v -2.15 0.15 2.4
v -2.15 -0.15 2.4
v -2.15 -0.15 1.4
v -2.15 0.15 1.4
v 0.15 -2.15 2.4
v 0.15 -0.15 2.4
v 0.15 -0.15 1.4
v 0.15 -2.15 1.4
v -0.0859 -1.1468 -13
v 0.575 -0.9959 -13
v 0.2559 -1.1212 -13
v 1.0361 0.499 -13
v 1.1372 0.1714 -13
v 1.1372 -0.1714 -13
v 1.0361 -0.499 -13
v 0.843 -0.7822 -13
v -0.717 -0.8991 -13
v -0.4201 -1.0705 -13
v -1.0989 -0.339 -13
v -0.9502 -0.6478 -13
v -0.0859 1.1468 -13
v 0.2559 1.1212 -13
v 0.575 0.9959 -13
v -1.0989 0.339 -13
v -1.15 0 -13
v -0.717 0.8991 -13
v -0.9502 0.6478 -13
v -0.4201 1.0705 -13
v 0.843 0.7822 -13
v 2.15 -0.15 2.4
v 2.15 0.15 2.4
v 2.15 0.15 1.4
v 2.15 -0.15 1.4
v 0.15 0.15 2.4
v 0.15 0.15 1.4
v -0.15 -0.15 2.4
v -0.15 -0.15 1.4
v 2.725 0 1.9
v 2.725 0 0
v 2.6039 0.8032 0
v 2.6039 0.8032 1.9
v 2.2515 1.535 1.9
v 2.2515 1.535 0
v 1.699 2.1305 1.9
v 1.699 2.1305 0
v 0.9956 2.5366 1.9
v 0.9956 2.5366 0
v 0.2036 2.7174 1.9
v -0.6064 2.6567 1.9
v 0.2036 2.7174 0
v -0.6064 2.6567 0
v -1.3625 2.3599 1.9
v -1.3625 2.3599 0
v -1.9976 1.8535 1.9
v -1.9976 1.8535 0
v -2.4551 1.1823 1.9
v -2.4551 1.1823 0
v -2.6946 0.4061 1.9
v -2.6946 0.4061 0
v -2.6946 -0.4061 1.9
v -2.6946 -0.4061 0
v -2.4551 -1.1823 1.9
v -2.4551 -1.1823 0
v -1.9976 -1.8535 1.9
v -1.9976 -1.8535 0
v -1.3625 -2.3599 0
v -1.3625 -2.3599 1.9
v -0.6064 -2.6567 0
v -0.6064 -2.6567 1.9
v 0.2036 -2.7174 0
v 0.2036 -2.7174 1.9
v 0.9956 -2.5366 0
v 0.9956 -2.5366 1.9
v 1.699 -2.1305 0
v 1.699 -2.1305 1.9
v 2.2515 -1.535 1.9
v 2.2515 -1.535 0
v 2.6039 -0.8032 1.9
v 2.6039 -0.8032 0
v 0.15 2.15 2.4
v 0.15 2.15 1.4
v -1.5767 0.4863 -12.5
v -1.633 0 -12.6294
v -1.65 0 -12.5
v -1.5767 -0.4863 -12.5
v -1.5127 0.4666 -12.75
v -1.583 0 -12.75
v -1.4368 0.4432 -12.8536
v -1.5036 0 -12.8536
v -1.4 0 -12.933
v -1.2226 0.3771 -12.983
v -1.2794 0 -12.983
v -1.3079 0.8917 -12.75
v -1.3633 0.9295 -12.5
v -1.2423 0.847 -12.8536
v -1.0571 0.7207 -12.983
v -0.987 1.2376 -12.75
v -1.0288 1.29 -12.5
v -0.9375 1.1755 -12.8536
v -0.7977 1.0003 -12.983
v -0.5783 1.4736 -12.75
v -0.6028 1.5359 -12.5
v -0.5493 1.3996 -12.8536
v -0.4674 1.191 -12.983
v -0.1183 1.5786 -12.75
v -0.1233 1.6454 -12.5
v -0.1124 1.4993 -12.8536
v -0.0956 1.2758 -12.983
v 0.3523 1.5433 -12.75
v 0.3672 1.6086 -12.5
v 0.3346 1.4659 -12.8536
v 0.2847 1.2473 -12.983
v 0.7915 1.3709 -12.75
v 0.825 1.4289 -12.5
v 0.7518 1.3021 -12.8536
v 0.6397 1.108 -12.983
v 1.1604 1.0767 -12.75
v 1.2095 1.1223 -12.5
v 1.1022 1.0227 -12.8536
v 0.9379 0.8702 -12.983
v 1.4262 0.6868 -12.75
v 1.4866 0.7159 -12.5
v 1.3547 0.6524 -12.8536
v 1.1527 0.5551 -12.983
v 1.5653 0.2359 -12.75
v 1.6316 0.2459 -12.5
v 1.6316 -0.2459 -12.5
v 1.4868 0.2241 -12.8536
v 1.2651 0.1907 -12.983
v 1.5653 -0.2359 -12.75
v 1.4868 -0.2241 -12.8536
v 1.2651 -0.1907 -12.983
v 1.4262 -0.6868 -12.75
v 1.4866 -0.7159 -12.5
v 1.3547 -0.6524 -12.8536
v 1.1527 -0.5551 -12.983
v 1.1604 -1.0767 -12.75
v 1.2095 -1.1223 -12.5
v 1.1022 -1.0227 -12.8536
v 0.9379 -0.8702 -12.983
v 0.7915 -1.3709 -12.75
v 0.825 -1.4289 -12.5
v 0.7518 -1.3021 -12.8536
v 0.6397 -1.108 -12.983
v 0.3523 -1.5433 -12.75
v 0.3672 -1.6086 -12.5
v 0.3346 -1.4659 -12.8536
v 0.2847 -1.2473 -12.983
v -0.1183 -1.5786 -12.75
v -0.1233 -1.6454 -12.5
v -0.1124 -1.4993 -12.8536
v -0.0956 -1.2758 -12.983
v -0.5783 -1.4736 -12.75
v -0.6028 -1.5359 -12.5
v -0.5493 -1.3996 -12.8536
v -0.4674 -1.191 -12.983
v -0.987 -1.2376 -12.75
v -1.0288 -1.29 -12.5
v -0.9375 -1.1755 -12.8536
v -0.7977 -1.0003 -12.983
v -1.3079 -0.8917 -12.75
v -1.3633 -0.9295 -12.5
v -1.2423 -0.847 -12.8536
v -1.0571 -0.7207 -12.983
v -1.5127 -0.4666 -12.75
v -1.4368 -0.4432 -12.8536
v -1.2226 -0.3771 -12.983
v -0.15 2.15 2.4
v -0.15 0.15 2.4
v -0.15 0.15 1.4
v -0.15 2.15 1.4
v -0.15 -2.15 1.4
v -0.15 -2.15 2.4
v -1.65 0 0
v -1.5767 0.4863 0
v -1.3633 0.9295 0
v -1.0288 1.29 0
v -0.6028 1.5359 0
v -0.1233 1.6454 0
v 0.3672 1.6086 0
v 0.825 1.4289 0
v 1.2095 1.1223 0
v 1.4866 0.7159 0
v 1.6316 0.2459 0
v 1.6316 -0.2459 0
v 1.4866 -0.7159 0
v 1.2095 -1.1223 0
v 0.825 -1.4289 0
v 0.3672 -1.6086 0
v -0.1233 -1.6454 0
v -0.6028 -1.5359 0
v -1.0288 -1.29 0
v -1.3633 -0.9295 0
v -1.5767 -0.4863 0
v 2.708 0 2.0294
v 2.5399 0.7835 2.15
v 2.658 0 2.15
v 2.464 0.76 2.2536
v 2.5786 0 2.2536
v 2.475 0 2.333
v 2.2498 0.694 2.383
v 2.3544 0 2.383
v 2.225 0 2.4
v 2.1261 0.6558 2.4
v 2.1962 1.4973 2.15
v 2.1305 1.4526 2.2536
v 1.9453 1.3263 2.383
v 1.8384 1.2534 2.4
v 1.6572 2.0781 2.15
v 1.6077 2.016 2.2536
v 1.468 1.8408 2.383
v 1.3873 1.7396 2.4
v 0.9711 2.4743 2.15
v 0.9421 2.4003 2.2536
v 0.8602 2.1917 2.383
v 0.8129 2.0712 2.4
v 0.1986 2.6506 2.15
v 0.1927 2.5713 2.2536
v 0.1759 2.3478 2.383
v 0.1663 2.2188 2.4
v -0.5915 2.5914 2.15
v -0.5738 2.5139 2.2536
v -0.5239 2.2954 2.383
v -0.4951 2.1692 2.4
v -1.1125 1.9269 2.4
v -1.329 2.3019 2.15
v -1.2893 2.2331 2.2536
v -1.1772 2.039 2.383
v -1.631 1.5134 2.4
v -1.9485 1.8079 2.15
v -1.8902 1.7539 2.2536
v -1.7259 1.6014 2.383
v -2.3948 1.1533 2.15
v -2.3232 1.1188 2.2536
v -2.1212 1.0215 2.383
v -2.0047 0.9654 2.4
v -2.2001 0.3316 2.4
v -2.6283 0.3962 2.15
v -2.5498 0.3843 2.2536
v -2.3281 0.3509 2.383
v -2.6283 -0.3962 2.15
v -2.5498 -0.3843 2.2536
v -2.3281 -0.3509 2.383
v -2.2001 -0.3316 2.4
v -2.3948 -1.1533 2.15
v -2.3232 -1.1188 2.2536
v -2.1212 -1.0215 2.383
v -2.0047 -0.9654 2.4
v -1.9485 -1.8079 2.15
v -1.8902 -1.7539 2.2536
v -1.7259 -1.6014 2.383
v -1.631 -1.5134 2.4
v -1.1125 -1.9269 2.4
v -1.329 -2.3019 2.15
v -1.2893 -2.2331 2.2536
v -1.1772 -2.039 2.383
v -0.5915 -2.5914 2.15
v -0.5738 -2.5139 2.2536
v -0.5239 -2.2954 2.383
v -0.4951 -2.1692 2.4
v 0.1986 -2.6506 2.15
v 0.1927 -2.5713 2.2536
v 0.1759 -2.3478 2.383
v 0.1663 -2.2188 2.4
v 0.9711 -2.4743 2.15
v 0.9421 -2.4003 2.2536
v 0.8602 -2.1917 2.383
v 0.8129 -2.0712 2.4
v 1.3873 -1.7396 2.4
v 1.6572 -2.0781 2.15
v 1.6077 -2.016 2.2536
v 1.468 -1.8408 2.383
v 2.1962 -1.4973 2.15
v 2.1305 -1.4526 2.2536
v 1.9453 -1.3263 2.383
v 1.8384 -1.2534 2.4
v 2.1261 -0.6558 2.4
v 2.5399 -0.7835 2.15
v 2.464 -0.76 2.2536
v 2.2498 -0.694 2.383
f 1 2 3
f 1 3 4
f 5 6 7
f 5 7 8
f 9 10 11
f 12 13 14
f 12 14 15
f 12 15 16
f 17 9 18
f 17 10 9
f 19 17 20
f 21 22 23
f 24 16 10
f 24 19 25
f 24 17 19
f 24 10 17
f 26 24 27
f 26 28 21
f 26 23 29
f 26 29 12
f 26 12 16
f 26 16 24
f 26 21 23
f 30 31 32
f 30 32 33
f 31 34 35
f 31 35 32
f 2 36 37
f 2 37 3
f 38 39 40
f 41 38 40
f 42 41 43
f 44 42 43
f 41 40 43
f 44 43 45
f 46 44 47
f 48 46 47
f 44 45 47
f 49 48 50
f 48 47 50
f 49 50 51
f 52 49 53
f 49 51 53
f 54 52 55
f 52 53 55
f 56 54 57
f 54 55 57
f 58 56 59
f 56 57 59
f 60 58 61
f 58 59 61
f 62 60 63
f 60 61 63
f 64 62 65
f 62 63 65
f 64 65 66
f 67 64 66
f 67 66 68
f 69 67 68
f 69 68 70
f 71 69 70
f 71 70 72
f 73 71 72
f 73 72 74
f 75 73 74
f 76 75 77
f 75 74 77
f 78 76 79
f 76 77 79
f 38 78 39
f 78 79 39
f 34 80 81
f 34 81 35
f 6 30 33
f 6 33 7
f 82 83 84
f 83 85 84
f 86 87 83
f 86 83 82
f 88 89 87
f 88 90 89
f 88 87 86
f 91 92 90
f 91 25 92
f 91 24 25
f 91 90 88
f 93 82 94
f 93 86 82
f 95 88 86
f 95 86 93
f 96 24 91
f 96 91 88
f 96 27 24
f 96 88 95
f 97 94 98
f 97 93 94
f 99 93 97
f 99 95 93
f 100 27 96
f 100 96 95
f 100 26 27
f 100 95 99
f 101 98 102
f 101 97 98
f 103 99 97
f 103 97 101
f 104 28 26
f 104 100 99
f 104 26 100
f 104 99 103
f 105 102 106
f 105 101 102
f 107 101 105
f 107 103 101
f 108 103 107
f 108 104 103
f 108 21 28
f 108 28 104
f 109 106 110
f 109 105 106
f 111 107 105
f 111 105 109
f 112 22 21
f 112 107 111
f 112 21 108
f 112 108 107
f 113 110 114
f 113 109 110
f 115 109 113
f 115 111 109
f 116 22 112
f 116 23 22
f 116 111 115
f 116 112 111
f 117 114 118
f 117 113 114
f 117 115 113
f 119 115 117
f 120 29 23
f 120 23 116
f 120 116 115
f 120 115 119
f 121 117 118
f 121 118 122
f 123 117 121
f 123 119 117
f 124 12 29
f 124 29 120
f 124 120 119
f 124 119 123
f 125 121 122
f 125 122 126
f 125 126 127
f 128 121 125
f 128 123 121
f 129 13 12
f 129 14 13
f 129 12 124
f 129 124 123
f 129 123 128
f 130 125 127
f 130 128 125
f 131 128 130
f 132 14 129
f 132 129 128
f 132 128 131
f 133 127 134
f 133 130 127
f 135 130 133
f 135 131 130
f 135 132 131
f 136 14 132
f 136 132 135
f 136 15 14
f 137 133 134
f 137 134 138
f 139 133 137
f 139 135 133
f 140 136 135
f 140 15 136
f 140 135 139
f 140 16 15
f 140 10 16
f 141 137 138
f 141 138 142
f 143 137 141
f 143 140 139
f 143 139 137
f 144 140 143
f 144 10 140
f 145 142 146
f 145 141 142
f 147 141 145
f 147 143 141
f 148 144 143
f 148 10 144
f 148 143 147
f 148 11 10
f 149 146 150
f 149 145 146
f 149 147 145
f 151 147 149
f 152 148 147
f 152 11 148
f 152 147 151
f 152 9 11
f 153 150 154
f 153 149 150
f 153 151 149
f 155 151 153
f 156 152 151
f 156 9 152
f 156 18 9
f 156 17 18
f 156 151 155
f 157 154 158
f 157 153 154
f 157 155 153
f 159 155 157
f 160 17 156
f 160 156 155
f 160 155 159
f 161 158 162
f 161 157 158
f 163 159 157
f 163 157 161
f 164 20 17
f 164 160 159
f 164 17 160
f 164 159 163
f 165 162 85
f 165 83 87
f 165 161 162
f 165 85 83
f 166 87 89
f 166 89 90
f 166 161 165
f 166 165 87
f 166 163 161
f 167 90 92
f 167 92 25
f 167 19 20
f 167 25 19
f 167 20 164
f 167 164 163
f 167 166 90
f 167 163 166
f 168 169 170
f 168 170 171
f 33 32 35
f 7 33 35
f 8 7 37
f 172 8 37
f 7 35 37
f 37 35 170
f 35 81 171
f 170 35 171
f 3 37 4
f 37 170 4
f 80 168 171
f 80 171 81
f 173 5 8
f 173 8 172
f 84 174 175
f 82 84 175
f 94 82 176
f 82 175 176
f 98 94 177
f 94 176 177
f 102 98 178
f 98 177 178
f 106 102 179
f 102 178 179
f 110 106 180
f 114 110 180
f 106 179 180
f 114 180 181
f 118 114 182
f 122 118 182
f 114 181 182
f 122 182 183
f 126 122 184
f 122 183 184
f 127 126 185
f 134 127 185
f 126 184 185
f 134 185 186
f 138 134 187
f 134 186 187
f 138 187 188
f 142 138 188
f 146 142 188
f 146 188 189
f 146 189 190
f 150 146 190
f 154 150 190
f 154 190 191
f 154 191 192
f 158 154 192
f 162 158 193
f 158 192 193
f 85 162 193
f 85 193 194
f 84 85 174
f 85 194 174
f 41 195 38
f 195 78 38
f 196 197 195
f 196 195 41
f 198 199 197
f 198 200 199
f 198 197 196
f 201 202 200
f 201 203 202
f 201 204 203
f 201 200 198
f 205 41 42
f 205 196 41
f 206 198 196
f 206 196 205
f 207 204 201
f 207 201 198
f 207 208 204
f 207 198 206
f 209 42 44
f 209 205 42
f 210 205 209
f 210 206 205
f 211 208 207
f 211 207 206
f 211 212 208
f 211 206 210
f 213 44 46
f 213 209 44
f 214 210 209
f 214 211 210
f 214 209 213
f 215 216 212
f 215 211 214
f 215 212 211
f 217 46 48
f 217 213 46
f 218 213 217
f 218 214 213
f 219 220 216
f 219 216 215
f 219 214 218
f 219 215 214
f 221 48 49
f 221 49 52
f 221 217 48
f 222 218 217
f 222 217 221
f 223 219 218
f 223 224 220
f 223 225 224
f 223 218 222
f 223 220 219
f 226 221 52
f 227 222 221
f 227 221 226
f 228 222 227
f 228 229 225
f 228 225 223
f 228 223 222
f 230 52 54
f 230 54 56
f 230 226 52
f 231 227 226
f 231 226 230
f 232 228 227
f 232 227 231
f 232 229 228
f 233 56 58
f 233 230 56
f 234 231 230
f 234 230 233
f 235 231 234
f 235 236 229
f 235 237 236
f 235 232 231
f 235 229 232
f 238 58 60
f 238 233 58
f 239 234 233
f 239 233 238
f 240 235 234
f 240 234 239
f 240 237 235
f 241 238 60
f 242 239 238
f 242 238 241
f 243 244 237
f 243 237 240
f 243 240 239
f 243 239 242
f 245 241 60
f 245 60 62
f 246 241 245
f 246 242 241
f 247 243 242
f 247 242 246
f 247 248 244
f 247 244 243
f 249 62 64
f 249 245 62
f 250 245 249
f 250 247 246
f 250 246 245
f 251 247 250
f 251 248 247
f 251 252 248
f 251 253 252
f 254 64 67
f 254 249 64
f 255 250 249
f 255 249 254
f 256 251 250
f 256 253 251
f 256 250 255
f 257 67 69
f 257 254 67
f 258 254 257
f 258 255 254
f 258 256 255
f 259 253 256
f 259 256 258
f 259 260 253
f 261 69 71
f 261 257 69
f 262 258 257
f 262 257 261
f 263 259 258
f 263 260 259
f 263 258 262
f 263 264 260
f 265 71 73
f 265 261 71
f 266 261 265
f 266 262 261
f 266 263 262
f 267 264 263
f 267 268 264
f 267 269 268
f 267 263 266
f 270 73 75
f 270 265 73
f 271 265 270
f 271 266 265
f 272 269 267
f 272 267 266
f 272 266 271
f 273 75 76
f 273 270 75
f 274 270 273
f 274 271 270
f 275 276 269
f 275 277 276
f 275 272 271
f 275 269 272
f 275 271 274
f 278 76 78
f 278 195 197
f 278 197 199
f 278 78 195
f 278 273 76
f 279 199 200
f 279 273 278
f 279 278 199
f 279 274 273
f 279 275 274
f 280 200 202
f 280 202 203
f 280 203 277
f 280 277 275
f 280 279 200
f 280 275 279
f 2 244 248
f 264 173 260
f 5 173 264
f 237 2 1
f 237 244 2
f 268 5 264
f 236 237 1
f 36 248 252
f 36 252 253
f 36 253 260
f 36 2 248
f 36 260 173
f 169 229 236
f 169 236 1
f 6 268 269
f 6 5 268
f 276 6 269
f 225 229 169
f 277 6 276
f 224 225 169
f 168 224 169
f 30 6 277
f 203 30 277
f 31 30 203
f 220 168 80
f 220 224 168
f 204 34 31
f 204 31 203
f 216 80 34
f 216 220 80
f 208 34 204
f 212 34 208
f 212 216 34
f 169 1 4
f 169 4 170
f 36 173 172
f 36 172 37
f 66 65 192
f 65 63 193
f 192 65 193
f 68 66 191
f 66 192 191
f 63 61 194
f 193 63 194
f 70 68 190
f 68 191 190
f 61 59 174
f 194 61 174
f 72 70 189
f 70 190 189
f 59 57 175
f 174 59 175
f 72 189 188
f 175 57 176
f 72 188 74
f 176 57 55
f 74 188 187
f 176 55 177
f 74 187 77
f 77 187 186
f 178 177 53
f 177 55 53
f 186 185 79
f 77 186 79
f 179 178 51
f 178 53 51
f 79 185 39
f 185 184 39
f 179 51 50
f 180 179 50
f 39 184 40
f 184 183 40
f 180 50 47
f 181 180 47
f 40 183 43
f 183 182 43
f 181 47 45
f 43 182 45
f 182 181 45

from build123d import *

# Parameters (mm, degrees)
SKICA1_R                 = 2.725
P_IDAT_VYSUNUT_M1_DEPTH  = 2.4
SKICA2_R                 = 1.65
P_IDAT_VYSUNUT_M3_DEPTH  = 13
ODEBRAT_VYSUNUT_M1_DEPTH = 1
ZAOBLIT1_R               = 0.5


with BuildPart() as part:
    # Skica1 → Přidat vysunutím1 (new body)
    with BuildSketch(Plane.XY):
        Circle(SKICA1_R)
    extrude(amount=P_IDAT_VYSUNUT_M1_DEPTH)

    # Skica2 → Přidat vysunutím3 (add)
    with BuildSketch(Plane(origin=(0, 0, 0), x_dir=(-1, 0, 0), z_dir=(0, 0, -1))):
        Circle(SKICA2_R)
    extrude(amount=P_IDAT_VYSUNUT_M3_DEPTH)

    # Skica4 → Odebrat vysunutím1 (cut)
    with BuildSketch(Plane.XY.offset(2.4)):
        Polygon((-0.15, 0.15), (-0.15, 2.15), (0.15, 2.15), (0.15, 0.15), (2.15, 0.15), (2.15, -0.15), (0.15, -0.15), (0.15, -2.15), (-0.15, -2.15), (-0.15, -0.15), (-2.15, -0.15), (-2.15, 0.15), align=None)
    extrude(amount=-ODEBRAT_VYSUNUT_M1_DEPTH, mode=Mode.SUBTRACT)

    # Zaoblit1
    zaoblit1_edges = [part.edges().sort_by_distance(p)[0] for p in [
        (-2.725, 0, 2.4),
        (1.65, 0, -13),
    ]]
    fillet(zaoblit1_edges, radius=ZAOBLIT1_R)


solid = part.part
